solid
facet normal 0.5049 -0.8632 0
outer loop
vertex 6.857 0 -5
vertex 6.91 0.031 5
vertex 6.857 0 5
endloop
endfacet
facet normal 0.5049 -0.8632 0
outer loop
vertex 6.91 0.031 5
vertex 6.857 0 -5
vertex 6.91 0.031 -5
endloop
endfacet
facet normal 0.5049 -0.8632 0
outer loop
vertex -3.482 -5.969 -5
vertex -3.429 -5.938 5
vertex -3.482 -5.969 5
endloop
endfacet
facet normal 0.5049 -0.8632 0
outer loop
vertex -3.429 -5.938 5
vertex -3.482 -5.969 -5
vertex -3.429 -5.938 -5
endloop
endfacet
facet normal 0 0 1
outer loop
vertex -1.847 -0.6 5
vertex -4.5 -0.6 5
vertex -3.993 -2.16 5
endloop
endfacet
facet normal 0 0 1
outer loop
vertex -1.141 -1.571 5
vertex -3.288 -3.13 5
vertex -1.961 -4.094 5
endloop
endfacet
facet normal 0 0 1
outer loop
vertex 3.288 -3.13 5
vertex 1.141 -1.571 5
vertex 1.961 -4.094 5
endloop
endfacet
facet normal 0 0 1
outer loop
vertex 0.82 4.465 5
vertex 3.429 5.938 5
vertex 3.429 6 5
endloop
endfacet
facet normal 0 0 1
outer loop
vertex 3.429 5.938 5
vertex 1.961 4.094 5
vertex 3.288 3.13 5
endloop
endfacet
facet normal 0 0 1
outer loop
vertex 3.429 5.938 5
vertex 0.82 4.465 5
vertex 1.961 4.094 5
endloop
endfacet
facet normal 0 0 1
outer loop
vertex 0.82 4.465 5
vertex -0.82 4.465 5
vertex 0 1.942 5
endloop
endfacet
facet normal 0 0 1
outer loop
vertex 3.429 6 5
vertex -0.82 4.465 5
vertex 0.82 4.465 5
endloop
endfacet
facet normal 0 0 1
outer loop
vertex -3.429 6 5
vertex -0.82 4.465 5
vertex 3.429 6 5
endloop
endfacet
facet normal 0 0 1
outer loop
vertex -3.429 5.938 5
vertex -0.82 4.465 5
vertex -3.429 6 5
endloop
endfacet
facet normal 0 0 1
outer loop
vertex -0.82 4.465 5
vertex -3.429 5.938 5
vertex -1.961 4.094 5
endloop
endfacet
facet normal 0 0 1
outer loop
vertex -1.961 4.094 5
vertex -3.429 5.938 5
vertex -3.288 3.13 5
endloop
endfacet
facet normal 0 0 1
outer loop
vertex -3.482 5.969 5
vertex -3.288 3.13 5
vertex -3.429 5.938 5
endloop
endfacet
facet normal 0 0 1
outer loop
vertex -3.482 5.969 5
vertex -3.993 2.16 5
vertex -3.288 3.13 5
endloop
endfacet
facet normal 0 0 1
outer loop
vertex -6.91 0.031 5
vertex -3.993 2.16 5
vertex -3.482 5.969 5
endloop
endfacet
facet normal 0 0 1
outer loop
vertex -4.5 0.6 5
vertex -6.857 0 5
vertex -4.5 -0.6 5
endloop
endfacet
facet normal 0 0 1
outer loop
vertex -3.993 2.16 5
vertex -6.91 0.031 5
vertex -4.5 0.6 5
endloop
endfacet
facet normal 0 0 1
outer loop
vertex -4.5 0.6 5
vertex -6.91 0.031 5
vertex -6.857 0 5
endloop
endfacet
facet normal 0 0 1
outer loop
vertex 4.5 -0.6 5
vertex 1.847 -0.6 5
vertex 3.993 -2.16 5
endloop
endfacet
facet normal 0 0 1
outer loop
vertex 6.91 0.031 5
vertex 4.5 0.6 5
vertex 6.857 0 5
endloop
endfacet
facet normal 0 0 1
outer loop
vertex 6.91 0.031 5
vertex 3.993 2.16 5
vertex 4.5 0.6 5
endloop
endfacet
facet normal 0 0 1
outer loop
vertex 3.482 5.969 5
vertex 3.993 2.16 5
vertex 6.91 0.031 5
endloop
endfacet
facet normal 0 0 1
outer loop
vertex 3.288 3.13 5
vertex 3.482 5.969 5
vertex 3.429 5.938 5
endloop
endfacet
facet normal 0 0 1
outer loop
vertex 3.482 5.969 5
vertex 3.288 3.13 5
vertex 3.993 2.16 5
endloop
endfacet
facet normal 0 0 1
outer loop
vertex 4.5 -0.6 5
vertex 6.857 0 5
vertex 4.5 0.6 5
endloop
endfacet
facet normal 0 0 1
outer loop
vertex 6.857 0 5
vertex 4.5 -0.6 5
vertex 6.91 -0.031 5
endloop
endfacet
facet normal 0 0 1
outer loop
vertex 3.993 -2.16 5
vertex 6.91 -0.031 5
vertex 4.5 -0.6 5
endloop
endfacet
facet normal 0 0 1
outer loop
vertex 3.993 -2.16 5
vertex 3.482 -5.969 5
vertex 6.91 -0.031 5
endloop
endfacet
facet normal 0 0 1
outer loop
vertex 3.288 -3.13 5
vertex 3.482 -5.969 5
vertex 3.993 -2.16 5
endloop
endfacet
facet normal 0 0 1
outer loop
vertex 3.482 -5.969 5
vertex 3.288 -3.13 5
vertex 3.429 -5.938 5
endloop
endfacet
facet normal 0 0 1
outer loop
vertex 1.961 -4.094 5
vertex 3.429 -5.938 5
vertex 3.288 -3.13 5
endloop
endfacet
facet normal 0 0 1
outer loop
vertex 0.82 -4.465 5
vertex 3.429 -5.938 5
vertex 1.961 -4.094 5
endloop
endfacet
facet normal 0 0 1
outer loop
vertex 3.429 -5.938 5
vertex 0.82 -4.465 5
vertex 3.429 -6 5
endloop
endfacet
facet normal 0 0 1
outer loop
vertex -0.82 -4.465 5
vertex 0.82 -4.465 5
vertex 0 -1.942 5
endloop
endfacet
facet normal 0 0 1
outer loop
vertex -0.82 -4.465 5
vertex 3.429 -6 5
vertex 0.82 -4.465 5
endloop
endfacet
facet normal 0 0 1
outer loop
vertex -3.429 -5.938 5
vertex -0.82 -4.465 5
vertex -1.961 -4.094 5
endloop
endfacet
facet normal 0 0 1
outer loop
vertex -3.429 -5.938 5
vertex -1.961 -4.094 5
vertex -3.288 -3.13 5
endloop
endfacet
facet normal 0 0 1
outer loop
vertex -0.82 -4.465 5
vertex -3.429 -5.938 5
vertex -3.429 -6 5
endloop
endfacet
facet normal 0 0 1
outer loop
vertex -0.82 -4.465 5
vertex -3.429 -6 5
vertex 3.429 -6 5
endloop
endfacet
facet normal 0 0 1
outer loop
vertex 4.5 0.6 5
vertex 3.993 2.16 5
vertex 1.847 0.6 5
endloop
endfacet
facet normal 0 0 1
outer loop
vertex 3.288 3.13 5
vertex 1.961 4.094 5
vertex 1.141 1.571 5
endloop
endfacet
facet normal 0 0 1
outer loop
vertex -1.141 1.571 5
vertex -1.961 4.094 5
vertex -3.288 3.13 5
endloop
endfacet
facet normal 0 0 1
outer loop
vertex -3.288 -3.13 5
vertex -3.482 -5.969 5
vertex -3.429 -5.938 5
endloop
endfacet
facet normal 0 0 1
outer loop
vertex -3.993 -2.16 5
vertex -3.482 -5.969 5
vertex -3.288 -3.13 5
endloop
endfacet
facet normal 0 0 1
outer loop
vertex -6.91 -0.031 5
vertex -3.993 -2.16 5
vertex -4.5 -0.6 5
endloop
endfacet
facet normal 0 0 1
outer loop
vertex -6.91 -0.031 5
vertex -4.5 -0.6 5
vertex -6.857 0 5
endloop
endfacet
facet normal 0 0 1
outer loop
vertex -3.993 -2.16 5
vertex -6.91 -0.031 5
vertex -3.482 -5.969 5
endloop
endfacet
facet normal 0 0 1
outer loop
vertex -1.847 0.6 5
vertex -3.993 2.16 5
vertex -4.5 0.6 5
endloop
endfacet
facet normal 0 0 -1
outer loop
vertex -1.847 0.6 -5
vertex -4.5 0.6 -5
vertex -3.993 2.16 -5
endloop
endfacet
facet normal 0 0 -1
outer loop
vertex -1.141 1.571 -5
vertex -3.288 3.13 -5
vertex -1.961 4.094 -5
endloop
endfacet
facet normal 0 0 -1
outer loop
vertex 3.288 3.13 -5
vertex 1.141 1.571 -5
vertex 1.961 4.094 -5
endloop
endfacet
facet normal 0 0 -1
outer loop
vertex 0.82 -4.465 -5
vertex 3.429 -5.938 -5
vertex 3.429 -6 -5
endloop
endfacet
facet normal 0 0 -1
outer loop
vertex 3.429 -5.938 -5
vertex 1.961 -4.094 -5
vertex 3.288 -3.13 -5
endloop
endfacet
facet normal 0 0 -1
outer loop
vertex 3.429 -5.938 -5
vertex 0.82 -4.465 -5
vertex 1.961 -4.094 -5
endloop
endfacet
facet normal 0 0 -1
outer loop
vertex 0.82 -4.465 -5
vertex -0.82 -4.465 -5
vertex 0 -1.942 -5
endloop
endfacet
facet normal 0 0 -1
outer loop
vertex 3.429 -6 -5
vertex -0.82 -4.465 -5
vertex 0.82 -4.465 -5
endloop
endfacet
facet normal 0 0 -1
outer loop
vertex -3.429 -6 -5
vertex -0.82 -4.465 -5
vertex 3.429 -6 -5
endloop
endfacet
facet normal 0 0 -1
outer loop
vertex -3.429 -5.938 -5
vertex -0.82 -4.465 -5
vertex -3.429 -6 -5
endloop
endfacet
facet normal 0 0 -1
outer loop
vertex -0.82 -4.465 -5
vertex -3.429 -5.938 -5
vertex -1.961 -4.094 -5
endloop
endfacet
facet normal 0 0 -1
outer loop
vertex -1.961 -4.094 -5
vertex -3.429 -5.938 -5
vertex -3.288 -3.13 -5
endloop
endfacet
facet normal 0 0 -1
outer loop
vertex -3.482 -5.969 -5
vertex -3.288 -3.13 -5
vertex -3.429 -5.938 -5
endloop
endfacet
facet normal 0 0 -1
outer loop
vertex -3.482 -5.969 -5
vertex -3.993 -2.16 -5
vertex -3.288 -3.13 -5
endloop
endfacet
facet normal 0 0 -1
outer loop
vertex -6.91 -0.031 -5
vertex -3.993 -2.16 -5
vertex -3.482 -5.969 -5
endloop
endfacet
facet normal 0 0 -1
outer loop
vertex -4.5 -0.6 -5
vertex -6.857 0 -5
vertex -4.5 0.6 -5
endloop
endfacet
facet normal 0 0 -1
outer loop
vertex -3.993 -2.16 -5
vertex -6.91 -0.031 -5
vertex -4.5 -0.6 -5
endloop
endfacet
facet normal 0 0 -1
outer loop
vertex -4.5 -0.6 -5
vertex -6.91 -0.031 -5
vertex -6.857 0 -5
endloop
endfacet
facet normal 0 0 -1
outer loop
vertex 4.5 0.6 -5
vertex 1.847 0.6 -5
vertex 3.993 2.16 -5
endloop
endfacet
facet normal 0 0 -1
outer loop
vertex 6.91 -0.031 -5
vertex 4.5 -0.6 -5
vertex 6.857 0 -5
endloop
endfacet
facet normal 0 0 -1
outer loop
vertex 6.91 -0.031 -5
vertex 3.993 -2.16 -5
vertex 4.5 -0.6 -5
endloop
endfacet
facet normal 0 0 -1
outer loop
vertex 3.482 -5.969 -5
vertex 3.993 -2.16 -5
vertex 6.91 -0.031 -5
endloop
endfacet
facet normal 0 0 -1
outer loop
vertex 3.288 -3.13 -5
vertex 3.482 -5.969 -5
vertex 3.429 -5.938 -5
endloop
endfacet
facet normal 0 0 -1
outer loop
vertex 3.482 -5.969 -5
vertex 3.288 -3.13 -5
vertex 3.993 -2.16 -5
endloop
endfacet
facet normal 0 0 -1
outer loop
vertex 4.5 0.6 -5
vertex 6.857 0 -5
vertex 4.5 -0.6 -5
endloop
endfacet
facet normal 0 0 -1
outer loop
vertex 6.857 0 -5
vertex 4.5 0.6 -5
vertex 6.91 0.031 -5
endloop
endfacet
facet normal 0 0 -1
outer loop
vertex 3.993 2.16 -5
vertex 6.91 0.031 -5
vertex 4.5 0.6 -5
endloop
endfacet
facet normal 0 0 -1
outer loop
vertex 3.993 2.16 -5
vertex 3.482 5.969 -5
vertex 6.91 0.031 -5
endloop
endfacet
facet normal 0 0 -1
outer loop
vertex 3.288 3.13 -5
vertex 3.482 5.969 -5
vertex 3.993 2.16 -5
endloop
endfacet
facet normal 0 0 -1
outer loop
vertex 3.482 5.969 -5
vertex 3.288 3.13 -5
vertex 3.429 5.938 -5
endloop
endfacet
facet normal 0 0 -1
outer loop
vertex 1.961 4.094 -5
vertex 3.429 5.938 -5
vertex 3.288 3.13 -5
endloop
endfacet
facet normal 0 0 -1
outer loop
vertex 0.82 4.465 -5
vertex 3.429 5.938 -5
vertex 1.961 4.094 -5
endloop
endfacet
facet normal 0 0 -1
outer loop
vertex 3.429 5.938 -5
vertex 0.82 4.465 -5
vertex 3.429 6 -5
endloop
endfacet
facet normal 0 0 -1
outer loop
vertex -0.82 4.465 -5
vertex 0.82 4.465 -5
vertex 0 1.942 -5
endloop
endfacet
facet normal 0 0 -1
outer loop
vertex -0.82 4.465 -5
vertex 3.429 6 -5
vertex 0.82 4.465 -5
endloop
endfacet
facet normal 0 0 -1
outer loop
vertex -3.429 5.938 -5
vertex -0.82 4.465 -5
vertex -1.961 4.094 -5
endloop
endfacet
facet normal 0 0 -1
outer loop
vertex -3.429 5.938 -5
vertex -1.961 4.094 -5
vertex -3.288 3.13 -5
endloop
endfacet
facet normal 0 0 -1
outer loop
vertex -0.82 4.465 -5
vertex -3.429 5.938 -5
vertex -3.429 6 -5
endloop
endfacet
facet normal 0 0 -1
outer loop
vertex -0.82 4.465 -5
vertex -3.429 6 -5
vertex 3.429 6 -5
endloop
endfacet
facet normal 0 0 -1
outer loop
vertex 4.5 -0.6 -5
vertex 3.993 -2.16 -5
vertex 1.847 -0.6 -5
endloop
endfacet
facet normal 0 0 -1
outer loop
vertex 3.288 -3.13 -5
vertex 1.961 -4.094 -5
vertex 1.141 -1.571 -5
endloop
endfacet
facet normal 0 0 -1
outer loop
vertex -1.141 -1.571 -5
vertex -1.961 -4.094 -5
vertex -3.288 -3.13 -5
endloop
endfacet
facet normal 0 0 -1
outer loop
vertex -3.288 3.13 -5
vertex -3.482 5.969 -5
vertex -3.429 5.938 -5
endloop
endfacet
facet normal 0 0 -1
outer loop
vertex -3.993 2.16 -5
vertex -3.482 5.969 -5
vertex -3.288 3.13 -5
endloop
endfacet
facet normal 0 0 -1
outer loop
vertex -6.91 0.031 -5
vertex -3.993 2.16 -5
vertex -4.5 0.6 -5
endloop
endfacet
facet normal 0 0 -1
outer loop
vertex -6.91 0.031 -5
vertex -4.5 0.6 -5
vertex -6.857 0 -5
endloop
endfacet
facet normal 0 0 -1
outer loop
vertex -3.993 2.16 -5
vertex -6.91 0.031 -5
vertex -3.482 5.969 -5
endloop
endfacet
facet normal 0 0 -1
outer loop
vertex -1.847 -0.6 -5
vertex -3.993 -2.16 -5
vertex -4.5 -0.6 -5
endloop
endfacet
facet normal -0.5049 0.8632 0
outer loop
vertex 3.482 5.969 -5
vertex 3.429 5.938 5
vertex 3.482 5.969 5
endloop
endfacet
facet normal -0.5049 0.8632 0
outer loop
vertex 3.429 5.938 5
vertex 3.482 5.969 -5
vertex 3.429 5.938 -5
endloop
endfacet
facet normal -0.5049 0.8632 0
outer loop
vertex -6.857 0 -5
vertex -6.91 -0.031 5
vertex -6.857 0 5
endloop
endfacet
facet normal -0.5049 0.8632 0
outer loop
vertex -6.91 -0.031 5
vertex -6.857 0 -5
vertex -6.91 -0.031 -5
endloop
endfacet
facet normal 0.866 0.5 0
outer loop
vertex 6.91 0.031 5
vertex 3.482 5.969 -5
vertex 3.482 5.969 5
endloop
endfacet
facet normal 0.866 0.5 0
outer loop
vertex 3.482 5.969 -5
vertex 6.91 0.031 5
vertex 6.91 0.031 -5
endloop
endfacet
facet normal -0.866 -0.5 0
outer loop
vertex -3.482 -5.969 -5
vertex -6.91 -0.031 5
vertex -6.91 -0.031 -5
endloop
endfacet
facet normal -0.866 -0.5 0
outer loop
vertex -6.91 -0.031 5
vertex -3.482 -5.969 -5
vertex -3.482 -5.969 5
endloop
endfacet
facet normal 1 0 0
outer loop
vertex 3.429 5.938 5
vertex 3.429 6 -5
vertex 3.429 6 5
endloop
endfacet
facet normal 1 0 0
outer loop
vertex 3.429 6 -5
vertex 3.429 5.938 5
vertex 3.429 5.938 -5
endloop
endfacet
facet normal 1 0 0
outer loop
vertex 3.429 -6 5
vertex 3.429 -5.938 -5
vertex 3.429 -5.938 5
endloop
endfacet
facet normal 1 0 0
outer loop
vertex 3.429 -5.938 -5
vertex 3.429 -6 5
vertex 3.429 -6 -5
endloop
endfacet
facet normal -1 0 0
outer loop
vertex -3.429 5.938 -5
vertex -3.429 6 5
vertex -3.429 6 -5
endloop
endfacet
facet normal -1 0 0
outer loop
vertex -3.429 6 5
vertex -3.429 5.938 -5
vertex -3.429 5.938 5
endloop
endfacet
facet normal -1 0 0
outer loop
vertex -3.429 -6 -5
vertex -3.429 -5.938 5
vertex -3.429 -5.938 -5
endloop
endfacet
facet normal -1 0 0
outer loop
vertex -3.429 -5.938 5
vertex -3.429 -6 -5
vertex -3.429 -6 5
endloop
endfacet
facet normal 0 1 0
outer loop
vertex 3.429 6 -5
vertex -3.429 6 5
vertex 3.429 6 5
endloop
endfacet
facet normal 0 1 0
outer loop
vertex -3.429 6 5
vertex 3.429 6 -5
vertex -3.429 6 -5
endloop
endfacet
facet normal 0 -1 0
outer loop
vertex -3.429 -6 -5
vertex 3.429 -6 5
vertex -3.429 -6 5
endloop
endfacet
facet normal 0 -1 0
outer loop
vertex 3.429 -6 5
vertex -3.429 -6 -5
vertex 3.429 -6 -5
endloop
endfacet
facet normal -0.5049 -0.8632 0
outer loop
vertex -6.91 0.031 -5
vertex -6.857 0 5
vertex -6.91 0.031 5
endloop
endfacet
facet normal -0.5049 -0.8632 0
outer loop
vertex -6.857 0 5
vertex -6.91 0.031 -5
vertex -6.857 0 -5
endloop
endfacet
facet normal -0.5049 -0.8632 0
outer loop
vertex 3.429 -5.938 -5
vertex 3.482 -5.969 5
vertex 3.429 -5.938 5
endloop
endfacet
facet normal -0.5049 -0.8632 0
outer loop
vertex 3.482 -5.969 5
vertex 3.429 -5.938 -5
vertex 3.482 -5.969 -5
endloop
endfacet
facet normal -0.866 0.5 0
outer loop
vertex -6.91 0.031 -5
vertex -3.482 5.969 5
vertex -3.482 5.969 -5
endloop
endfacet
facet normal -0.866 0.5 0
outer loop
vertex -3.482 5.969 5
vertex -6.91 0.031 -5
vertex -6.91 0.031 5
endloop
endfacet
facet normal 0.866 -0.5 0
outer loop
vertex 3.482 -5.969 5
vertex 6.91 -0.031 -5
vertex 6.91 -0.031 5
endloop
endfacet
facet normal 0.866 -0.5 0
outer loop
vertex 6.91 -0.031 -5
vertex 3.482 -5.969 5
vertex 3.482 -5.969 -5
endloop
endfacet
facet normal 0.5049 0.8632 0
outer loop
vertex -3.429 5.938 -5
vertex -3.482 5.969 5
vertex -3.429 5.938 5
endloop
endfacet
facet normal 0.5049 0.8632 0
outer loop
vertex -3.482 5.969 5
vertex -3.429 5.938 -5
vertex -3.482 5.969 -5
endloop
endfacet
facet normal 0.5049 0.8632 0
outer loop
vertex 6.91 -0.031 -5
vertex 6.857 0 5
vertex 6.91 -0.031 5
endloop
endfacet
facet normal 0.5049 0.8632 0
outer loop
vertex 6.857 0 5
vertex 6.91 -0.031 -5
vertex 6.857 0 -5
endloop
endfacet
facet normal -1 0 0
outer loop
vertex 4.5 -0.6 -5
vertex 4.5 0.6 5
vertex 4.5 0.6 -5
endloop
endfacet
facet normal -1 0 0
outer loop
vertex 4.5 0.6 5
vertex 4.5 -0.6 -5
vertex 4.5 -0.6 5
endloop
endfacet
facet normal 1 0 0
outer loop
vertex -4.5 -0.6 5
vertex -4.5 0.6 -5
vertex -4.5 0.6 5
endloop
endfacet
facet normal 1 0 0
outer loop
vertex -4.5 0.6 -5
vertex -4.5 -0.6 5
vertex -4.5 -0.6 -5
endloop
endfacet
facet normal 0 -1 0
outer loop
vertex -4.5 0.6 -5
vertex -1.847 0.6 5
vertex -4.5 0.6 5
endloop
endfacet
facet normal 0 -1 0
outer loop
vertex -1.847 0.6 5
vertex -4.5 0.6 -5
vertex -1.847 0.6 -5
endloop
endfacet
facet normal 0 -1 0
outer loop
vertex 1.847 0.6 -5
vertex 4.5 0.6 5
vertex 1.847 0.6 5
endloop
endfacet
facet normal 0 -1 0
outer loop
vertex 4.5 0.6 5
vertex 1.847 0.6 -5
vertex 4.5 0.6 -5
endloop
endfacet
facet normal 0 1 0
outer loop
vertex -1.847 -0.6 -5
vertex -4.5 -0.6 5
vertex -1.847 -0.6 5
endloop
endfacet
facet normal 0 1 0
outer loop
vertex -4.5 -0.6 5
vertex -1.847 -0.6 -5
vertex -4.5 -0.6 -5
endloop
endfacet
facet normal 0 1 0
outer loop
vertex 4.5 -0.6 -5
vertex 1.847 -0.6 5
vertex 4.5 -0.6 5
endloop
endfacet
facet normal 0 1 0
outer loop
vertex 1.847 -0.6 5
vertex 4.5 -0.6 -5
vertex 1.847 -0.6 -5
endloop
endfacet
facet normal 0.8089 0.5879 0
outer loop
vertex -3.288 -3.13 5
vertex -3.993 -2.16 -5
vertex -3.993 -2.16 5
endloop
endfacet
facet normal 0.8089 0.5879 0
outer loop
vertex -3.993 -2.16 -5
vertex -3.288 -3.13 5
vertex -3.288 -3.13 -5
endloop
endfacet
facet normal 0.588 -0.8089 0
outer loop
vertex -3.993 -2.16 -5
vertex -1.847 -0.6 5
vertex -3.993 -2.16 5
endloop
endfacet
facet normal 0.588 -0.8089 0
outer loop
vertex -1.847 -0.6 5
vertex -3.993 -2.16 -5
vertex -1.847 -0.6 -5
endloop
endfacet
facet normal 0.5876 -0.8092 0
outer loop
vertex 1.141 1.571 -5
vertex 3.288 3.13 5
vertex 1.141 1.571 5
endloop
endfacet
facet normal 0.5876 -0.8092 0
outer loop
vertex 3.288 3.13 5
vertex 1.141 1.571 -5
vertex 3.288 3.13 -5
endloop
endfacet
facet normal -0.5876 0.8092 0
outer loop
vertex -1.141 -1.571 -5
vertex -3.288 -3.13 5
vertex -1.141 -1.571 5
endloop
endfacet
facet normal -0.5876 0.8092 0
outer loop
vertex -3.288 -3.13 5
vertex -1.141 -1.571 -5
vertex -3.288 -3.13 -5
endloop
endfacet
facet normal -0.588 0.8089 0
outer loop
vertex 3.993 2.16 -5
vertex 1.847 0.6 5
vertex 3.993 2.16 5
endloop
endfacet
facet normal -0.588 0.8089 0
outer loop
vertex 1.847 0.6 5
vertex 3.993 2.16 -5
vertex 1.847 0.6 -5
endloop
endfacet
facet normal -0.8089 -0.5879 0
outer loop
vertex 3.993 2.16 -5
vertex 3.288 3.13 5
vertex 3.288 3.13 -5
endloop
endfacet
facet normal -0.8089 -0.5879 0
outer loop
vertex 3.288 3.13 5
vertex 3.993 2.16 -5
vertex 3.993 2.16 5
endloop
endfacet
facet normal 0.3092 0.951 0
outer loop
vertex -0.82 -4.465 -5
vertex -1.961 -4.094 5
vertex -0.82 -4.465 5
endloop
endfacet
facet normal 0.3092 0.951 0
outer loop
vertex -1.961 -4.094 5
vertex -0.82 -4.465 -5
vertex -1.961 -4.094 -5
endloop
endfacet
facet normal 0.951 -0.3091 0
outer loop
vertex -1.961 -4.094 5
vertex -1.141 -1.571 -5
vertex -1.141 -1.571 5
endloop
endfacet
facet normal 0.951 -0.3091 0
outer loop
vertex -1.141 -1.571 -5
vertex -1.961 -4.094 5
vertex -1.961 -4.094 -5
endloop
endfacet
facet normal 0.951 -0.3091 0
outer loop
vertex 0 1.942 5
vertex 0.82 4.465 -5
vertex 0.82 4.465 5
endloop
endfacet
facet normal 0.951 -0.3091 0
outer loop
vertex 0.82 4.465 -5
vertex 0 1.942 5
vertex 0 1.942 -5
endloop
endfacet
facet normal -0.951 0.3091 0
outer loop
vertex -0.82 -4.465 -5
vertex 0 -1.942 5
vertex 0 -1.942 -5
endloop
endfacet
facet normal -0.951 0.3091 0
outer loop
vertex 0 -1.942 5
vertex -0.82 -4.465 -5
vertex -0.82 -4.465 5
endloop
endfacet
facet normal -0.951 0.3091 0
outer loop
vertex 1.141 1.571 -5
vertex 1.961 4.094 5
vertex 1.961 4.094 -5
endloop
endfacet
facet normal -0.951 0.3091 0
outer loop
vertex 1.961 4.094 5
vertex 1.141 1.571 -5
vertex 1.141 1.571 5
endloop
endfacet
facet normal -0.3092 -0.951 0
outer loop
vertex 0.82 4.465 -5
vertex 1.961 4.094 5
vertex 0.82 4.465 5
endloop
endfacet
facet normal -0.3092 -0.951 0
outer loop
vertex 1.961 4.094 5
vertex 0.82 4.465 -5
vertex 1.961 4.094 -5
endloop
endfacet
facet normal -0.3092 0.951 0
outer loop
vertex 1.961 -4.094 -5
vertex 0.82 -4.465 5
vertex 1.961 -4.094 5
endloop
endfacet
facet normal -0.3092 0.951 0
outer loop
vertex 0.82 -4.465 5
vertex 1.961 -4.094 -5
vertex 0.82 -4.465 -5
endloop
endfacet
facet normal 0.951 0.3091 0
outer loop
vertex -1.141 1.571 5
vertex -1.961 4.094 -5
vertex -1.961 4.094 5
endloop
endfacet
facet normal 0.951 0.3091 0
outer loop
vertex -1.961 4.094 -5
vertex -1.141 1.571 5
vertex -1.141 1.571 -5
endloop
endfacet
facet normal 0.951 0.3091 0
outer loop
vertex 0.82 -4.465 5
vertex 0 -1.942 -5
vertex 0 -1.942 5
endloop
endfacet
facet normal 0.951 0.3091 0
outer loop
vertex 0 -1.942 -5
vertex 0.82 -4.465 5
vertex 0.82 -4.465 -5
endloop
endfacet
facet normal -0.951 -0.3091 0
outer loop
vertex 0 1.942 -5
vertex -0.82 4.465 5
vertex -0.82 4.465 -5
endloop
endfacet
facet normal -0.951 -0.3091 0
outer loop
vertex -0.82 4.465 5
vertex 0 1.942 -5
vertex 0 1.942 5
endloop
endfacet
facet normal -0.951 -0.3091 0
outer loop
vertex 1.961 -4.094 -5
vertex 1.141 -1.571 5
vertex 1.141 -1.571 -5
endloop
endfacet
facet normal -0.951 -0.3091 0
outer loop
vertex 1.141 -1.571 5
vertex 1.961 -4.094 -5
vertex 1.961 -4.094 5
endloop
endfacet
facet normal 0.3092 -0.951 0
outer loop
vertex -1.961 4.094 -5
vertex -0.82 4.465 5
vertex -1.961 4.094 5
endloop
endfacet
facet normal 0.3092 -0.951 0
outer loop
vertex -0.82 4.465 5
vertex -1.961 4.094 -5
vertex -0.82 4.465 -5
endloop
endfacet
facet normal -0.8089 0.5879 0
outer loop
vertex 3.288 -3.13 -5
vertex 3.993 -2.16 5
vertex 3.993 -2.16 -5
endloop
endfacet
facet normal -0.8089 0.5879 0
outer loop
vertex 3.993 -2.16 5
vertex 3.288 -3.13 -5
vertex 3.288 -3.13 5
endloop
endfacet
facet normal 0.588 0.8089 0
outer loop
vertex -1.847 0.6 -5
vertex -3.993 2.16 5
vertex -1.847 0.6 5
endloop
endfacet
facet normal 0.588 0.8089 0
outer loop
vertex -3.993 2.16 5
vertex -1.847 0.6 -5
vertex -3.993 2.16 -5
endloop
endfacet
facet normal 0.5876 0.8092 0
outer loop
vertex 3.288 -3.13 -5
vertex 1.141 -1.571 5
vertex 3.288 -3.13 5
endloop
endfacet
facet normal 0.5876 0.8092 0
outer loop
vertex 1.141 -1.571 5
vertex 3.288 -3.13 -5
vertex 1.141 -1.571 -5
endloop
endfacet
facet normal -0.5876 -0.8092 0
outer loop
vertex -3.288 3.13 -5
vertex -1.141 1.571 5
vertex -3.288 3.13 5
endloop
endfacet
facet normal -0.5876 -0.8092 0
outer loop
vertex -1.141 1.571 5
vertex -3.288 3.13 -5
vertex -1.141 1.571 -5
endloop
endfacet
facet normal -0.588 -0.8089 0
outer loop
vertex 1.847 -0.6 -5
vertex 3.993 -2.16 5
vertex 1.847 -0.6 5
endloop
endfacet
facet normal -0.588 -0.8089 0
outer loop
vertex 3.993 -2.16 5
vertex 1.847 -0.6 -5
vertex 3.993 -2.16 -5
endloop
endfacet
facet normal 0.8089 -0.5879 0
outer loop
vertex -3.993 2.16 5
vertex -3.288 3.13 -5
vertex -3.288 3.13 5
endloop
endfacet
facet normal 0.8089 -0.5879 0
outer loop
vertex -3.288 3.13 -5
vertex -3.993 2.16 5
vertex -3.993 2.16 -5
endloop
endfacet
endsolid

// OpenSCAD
module hexagon(size, height) {
  boxWidth = size/1.75;
  for (r = [-60, 0, 60])
    rotate([0,0,r])
      cube([boxWidth, size, height], true);
}
module shaft(){
    difference(){
        cylinder(20, r=2.5+0.2, center=true, $fn=100);
        translate([2.5+0.2, 0, 0])cube([1, 10, 20],true);
    }
}
module unknown(){
    for(j=[0:9])rotate([0,0,j*36])cube([9,1.2,20], true);
}


difference(){
    //hexagon(20.7846,10);
    hexagon(12, 10);

    //shaft();
    unknown();
}
